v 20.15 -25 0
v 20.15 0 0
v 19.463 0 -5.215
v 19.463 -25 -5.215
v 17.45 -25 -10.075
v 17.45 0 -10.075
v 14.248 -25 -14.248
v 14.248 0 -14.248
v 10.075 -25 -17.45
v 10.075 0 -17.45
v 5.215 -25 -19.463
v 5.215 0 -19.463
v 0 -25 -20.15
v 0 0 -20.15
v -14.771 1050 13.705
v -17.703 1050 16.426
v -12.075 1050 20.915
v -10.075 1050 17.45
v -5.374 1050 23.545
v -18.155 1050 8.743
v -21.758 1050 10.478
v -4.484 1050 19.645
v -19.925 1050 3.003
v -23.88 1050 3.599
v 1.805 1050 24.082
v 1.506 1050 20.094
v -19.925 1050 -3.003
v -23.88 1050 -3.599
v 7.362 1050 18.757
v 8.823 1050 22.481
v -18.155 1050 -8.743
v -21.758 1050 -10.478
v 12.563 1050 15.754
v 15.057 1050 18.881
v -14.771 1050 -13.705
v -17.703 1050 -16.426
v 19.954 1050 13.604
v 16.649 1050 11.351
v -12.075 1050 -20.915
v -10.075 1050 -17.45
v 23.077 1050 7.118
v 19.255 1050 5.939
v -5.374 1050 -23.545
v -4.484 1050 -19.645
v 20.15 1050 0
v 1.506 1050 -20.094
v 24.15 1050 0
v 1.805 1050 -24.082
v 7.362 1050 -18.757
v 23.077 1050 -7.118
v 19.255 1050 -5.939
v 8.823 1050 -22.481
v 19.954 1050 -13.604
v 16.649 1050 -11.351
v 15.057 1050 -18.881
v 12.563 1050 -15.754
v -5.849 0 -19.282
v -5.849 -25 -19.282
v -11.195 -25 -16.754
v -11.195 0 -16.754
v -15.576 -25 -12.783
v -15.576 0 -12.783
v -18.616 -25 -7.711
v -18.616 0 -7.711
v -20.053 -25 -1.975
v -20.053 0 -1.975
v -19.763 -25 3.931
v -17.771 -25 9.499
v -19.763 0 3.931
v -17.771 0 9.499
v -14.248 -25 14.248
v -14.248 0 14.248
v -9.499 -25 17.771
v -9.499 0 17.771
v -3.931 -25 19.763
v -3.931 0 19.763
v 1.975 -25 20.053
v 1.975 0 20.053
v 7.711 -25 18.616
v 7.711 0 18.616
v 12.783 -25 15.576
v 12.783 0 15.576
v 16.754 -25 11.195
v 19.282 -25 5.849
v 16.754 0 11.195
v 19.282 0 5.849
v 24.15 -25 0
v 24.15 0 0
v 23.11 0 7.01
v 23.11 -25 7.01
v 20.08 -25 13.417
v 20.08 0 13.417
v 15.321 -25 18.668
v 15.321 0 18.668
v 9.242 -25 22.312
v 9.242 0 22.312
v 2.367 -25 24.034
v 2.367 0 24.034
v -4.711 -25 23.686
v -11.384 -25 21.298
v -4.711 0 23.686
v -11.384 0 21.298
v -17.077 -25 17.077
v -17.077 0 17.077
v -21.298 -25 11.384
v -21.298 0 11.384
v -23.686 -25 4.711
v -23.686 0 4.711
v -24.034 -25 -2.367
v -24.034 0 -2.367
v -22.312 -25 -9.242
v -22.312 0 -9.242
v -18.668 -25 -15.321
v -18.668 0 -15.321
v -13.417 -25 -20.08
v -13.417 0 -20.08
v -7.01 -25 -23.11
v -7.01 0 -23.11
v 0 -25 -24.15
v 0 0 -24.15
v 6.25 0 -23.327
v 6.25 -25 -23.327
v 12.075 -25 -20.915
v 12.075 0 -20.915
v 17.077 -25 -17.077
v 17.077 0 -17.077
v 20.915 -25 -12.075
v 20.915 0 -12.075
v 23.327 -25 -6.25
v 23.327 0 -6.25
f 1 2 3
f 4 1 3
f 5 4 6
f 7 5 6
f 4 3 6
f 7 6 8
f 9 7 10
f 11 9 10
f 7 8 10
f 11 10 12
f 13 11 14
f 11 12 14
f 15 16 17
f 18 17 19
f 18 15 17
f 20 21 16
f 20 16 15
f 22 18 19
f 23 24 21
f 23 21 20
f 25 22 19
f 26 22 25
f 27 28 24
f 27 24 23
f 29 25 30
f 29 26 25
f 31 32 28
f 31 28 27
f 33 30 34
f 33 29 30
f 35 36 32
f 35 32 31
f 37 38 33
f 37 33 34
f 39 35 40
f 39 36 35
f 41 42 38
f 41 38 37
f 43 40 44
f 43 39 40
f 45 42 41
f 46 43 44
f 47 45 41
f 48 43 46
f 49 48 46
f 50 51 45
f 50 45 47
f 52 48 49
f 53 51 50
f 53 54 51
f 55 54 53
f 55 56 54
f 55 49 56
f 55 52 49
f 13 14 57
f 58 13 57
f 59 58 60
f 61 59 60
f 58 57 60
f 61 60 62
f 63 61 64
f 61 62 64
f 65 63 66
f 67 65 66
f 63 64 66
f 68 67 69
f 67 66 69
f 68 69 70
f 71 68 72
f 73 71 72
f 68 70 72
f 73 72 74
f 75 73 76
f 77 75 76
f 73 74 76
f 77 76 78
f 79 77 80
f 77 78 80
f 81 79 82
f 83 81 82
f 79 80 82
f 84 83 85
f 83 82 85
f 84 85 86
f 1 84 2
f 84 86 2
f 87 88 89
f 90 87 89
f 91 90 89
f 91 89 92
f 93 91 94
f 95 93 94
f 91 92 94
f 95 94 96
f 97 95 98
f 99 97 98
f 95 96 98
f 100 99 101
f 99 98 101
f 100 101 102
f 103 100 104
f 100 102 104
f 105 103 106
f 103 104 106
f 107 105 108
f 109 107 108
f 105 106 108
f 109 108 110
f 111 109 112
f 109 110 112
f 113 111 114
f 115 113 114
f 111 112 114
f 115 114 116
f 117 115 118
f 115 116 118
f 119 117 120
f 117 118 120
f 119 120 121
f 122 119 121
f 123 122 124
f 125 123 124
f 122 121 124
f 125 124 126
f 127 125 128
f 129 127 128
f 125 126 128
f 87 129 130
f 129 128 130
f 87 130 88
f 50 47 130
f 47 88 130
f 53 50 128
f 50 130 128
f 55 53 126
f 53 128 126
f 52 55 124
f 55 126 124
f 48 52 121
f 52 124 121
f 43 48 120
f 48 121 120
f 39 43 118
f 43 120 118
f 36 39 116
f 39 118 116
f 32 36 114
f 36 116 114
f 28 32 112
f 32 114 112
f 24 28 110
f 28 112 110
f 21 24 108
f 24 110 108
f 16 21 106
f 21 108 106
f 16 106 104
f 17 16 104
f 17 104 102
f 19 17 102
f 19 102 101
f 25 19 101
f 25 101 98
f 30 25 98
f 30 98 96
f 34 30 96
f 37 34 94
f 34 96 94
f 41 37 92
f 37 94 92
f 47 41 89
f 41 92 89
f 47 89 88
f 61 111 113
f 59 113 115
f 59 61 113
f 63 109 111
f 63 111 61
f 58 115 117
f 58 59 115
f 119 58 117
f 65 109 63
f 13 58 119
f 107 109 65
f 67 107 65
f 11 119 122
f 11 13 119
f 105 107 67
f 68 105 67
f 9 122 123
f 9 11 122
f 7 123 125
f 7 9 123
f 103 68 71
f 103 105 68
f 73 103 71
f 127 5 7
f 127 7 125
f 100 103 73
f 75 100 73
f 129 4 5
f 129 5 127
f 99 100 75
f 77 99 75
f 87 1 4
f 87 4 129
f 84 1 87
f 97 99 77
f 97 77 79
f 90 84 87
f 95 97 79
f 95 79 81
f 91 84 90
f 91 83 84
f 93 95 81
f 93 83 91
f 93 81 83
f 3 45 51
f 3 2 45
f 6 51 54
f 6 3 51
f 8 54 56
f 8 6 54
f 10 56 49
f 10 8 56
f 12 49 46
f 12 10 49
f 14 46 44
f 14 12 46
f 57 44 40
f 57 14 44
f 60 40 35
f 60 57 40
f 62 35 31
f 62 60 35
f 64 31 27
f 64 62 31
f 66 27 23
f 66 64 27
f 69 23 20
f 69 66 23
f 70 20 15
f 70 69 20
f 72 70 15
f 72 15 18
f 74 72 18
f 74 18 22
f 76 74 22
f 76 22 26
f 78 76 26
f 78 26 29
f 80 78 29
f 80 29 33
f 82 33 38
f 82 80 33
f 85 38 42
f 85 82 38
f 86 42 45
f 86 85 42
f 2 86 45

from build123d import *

# Parameters (mm, degrees)
F1_DEPTH    = 25
F1_FACE_R   = 24.15
F1_FACE_R_2 = 20.15
F2_DEPTH    = 50
F2_FACE_R   = 24.15
F2_FACE_R_2 = 20.15
F3_DEPTH    = 1000


with BuildPart() as f1:
    # F0 (on Front) → F1 (new body)
    with BuildSketch(Plane.XZ):
        with BuildLine():
            ThreePointArc((0, -24.15), (17.076629, -17.076629), (24.15, 0))
            ThreePointArc((24.15, 0), (-17.076629, 17.076629), (0, -24.15))
        make_face()
        with BuildLine():
            ThreePointArc((20.15, 0), (14.248202, -14.248202), (0, -20.15))
            ThreePointArc((0, -20.15), (-14.248202, 14.248202), (20.15, 0))
        make_face(mode=Mode.SUBTRACT)
    extrude(amount=F1_DEPTH)

    # F1_face (on face) → F2 (join)
    with BuildSketch(Plane(origin=(0, 0, 0), x_dir=(1, 0, 0), z_dir=(0, 1, 0))):
        Circle(F1_FACE_R)
        Circle(F1_FACE_R_2, mode=Mode.SUBTRACT)
    extrude(amount=F2_DEPTH)

    # F2_face (on face) → F3 (join)
    with BuildSketch(Plane(origin=(0, 50, 0), x_dir=(1, 0, 0), z_dir=(0, 1, 0))):
        Circle(F2_FACE_R)
        Circle(F2_FACE_R_2, mode=Mode.SUBTRACT)
    extrude(amount=F3_DEPTH)


solid = f1.part
